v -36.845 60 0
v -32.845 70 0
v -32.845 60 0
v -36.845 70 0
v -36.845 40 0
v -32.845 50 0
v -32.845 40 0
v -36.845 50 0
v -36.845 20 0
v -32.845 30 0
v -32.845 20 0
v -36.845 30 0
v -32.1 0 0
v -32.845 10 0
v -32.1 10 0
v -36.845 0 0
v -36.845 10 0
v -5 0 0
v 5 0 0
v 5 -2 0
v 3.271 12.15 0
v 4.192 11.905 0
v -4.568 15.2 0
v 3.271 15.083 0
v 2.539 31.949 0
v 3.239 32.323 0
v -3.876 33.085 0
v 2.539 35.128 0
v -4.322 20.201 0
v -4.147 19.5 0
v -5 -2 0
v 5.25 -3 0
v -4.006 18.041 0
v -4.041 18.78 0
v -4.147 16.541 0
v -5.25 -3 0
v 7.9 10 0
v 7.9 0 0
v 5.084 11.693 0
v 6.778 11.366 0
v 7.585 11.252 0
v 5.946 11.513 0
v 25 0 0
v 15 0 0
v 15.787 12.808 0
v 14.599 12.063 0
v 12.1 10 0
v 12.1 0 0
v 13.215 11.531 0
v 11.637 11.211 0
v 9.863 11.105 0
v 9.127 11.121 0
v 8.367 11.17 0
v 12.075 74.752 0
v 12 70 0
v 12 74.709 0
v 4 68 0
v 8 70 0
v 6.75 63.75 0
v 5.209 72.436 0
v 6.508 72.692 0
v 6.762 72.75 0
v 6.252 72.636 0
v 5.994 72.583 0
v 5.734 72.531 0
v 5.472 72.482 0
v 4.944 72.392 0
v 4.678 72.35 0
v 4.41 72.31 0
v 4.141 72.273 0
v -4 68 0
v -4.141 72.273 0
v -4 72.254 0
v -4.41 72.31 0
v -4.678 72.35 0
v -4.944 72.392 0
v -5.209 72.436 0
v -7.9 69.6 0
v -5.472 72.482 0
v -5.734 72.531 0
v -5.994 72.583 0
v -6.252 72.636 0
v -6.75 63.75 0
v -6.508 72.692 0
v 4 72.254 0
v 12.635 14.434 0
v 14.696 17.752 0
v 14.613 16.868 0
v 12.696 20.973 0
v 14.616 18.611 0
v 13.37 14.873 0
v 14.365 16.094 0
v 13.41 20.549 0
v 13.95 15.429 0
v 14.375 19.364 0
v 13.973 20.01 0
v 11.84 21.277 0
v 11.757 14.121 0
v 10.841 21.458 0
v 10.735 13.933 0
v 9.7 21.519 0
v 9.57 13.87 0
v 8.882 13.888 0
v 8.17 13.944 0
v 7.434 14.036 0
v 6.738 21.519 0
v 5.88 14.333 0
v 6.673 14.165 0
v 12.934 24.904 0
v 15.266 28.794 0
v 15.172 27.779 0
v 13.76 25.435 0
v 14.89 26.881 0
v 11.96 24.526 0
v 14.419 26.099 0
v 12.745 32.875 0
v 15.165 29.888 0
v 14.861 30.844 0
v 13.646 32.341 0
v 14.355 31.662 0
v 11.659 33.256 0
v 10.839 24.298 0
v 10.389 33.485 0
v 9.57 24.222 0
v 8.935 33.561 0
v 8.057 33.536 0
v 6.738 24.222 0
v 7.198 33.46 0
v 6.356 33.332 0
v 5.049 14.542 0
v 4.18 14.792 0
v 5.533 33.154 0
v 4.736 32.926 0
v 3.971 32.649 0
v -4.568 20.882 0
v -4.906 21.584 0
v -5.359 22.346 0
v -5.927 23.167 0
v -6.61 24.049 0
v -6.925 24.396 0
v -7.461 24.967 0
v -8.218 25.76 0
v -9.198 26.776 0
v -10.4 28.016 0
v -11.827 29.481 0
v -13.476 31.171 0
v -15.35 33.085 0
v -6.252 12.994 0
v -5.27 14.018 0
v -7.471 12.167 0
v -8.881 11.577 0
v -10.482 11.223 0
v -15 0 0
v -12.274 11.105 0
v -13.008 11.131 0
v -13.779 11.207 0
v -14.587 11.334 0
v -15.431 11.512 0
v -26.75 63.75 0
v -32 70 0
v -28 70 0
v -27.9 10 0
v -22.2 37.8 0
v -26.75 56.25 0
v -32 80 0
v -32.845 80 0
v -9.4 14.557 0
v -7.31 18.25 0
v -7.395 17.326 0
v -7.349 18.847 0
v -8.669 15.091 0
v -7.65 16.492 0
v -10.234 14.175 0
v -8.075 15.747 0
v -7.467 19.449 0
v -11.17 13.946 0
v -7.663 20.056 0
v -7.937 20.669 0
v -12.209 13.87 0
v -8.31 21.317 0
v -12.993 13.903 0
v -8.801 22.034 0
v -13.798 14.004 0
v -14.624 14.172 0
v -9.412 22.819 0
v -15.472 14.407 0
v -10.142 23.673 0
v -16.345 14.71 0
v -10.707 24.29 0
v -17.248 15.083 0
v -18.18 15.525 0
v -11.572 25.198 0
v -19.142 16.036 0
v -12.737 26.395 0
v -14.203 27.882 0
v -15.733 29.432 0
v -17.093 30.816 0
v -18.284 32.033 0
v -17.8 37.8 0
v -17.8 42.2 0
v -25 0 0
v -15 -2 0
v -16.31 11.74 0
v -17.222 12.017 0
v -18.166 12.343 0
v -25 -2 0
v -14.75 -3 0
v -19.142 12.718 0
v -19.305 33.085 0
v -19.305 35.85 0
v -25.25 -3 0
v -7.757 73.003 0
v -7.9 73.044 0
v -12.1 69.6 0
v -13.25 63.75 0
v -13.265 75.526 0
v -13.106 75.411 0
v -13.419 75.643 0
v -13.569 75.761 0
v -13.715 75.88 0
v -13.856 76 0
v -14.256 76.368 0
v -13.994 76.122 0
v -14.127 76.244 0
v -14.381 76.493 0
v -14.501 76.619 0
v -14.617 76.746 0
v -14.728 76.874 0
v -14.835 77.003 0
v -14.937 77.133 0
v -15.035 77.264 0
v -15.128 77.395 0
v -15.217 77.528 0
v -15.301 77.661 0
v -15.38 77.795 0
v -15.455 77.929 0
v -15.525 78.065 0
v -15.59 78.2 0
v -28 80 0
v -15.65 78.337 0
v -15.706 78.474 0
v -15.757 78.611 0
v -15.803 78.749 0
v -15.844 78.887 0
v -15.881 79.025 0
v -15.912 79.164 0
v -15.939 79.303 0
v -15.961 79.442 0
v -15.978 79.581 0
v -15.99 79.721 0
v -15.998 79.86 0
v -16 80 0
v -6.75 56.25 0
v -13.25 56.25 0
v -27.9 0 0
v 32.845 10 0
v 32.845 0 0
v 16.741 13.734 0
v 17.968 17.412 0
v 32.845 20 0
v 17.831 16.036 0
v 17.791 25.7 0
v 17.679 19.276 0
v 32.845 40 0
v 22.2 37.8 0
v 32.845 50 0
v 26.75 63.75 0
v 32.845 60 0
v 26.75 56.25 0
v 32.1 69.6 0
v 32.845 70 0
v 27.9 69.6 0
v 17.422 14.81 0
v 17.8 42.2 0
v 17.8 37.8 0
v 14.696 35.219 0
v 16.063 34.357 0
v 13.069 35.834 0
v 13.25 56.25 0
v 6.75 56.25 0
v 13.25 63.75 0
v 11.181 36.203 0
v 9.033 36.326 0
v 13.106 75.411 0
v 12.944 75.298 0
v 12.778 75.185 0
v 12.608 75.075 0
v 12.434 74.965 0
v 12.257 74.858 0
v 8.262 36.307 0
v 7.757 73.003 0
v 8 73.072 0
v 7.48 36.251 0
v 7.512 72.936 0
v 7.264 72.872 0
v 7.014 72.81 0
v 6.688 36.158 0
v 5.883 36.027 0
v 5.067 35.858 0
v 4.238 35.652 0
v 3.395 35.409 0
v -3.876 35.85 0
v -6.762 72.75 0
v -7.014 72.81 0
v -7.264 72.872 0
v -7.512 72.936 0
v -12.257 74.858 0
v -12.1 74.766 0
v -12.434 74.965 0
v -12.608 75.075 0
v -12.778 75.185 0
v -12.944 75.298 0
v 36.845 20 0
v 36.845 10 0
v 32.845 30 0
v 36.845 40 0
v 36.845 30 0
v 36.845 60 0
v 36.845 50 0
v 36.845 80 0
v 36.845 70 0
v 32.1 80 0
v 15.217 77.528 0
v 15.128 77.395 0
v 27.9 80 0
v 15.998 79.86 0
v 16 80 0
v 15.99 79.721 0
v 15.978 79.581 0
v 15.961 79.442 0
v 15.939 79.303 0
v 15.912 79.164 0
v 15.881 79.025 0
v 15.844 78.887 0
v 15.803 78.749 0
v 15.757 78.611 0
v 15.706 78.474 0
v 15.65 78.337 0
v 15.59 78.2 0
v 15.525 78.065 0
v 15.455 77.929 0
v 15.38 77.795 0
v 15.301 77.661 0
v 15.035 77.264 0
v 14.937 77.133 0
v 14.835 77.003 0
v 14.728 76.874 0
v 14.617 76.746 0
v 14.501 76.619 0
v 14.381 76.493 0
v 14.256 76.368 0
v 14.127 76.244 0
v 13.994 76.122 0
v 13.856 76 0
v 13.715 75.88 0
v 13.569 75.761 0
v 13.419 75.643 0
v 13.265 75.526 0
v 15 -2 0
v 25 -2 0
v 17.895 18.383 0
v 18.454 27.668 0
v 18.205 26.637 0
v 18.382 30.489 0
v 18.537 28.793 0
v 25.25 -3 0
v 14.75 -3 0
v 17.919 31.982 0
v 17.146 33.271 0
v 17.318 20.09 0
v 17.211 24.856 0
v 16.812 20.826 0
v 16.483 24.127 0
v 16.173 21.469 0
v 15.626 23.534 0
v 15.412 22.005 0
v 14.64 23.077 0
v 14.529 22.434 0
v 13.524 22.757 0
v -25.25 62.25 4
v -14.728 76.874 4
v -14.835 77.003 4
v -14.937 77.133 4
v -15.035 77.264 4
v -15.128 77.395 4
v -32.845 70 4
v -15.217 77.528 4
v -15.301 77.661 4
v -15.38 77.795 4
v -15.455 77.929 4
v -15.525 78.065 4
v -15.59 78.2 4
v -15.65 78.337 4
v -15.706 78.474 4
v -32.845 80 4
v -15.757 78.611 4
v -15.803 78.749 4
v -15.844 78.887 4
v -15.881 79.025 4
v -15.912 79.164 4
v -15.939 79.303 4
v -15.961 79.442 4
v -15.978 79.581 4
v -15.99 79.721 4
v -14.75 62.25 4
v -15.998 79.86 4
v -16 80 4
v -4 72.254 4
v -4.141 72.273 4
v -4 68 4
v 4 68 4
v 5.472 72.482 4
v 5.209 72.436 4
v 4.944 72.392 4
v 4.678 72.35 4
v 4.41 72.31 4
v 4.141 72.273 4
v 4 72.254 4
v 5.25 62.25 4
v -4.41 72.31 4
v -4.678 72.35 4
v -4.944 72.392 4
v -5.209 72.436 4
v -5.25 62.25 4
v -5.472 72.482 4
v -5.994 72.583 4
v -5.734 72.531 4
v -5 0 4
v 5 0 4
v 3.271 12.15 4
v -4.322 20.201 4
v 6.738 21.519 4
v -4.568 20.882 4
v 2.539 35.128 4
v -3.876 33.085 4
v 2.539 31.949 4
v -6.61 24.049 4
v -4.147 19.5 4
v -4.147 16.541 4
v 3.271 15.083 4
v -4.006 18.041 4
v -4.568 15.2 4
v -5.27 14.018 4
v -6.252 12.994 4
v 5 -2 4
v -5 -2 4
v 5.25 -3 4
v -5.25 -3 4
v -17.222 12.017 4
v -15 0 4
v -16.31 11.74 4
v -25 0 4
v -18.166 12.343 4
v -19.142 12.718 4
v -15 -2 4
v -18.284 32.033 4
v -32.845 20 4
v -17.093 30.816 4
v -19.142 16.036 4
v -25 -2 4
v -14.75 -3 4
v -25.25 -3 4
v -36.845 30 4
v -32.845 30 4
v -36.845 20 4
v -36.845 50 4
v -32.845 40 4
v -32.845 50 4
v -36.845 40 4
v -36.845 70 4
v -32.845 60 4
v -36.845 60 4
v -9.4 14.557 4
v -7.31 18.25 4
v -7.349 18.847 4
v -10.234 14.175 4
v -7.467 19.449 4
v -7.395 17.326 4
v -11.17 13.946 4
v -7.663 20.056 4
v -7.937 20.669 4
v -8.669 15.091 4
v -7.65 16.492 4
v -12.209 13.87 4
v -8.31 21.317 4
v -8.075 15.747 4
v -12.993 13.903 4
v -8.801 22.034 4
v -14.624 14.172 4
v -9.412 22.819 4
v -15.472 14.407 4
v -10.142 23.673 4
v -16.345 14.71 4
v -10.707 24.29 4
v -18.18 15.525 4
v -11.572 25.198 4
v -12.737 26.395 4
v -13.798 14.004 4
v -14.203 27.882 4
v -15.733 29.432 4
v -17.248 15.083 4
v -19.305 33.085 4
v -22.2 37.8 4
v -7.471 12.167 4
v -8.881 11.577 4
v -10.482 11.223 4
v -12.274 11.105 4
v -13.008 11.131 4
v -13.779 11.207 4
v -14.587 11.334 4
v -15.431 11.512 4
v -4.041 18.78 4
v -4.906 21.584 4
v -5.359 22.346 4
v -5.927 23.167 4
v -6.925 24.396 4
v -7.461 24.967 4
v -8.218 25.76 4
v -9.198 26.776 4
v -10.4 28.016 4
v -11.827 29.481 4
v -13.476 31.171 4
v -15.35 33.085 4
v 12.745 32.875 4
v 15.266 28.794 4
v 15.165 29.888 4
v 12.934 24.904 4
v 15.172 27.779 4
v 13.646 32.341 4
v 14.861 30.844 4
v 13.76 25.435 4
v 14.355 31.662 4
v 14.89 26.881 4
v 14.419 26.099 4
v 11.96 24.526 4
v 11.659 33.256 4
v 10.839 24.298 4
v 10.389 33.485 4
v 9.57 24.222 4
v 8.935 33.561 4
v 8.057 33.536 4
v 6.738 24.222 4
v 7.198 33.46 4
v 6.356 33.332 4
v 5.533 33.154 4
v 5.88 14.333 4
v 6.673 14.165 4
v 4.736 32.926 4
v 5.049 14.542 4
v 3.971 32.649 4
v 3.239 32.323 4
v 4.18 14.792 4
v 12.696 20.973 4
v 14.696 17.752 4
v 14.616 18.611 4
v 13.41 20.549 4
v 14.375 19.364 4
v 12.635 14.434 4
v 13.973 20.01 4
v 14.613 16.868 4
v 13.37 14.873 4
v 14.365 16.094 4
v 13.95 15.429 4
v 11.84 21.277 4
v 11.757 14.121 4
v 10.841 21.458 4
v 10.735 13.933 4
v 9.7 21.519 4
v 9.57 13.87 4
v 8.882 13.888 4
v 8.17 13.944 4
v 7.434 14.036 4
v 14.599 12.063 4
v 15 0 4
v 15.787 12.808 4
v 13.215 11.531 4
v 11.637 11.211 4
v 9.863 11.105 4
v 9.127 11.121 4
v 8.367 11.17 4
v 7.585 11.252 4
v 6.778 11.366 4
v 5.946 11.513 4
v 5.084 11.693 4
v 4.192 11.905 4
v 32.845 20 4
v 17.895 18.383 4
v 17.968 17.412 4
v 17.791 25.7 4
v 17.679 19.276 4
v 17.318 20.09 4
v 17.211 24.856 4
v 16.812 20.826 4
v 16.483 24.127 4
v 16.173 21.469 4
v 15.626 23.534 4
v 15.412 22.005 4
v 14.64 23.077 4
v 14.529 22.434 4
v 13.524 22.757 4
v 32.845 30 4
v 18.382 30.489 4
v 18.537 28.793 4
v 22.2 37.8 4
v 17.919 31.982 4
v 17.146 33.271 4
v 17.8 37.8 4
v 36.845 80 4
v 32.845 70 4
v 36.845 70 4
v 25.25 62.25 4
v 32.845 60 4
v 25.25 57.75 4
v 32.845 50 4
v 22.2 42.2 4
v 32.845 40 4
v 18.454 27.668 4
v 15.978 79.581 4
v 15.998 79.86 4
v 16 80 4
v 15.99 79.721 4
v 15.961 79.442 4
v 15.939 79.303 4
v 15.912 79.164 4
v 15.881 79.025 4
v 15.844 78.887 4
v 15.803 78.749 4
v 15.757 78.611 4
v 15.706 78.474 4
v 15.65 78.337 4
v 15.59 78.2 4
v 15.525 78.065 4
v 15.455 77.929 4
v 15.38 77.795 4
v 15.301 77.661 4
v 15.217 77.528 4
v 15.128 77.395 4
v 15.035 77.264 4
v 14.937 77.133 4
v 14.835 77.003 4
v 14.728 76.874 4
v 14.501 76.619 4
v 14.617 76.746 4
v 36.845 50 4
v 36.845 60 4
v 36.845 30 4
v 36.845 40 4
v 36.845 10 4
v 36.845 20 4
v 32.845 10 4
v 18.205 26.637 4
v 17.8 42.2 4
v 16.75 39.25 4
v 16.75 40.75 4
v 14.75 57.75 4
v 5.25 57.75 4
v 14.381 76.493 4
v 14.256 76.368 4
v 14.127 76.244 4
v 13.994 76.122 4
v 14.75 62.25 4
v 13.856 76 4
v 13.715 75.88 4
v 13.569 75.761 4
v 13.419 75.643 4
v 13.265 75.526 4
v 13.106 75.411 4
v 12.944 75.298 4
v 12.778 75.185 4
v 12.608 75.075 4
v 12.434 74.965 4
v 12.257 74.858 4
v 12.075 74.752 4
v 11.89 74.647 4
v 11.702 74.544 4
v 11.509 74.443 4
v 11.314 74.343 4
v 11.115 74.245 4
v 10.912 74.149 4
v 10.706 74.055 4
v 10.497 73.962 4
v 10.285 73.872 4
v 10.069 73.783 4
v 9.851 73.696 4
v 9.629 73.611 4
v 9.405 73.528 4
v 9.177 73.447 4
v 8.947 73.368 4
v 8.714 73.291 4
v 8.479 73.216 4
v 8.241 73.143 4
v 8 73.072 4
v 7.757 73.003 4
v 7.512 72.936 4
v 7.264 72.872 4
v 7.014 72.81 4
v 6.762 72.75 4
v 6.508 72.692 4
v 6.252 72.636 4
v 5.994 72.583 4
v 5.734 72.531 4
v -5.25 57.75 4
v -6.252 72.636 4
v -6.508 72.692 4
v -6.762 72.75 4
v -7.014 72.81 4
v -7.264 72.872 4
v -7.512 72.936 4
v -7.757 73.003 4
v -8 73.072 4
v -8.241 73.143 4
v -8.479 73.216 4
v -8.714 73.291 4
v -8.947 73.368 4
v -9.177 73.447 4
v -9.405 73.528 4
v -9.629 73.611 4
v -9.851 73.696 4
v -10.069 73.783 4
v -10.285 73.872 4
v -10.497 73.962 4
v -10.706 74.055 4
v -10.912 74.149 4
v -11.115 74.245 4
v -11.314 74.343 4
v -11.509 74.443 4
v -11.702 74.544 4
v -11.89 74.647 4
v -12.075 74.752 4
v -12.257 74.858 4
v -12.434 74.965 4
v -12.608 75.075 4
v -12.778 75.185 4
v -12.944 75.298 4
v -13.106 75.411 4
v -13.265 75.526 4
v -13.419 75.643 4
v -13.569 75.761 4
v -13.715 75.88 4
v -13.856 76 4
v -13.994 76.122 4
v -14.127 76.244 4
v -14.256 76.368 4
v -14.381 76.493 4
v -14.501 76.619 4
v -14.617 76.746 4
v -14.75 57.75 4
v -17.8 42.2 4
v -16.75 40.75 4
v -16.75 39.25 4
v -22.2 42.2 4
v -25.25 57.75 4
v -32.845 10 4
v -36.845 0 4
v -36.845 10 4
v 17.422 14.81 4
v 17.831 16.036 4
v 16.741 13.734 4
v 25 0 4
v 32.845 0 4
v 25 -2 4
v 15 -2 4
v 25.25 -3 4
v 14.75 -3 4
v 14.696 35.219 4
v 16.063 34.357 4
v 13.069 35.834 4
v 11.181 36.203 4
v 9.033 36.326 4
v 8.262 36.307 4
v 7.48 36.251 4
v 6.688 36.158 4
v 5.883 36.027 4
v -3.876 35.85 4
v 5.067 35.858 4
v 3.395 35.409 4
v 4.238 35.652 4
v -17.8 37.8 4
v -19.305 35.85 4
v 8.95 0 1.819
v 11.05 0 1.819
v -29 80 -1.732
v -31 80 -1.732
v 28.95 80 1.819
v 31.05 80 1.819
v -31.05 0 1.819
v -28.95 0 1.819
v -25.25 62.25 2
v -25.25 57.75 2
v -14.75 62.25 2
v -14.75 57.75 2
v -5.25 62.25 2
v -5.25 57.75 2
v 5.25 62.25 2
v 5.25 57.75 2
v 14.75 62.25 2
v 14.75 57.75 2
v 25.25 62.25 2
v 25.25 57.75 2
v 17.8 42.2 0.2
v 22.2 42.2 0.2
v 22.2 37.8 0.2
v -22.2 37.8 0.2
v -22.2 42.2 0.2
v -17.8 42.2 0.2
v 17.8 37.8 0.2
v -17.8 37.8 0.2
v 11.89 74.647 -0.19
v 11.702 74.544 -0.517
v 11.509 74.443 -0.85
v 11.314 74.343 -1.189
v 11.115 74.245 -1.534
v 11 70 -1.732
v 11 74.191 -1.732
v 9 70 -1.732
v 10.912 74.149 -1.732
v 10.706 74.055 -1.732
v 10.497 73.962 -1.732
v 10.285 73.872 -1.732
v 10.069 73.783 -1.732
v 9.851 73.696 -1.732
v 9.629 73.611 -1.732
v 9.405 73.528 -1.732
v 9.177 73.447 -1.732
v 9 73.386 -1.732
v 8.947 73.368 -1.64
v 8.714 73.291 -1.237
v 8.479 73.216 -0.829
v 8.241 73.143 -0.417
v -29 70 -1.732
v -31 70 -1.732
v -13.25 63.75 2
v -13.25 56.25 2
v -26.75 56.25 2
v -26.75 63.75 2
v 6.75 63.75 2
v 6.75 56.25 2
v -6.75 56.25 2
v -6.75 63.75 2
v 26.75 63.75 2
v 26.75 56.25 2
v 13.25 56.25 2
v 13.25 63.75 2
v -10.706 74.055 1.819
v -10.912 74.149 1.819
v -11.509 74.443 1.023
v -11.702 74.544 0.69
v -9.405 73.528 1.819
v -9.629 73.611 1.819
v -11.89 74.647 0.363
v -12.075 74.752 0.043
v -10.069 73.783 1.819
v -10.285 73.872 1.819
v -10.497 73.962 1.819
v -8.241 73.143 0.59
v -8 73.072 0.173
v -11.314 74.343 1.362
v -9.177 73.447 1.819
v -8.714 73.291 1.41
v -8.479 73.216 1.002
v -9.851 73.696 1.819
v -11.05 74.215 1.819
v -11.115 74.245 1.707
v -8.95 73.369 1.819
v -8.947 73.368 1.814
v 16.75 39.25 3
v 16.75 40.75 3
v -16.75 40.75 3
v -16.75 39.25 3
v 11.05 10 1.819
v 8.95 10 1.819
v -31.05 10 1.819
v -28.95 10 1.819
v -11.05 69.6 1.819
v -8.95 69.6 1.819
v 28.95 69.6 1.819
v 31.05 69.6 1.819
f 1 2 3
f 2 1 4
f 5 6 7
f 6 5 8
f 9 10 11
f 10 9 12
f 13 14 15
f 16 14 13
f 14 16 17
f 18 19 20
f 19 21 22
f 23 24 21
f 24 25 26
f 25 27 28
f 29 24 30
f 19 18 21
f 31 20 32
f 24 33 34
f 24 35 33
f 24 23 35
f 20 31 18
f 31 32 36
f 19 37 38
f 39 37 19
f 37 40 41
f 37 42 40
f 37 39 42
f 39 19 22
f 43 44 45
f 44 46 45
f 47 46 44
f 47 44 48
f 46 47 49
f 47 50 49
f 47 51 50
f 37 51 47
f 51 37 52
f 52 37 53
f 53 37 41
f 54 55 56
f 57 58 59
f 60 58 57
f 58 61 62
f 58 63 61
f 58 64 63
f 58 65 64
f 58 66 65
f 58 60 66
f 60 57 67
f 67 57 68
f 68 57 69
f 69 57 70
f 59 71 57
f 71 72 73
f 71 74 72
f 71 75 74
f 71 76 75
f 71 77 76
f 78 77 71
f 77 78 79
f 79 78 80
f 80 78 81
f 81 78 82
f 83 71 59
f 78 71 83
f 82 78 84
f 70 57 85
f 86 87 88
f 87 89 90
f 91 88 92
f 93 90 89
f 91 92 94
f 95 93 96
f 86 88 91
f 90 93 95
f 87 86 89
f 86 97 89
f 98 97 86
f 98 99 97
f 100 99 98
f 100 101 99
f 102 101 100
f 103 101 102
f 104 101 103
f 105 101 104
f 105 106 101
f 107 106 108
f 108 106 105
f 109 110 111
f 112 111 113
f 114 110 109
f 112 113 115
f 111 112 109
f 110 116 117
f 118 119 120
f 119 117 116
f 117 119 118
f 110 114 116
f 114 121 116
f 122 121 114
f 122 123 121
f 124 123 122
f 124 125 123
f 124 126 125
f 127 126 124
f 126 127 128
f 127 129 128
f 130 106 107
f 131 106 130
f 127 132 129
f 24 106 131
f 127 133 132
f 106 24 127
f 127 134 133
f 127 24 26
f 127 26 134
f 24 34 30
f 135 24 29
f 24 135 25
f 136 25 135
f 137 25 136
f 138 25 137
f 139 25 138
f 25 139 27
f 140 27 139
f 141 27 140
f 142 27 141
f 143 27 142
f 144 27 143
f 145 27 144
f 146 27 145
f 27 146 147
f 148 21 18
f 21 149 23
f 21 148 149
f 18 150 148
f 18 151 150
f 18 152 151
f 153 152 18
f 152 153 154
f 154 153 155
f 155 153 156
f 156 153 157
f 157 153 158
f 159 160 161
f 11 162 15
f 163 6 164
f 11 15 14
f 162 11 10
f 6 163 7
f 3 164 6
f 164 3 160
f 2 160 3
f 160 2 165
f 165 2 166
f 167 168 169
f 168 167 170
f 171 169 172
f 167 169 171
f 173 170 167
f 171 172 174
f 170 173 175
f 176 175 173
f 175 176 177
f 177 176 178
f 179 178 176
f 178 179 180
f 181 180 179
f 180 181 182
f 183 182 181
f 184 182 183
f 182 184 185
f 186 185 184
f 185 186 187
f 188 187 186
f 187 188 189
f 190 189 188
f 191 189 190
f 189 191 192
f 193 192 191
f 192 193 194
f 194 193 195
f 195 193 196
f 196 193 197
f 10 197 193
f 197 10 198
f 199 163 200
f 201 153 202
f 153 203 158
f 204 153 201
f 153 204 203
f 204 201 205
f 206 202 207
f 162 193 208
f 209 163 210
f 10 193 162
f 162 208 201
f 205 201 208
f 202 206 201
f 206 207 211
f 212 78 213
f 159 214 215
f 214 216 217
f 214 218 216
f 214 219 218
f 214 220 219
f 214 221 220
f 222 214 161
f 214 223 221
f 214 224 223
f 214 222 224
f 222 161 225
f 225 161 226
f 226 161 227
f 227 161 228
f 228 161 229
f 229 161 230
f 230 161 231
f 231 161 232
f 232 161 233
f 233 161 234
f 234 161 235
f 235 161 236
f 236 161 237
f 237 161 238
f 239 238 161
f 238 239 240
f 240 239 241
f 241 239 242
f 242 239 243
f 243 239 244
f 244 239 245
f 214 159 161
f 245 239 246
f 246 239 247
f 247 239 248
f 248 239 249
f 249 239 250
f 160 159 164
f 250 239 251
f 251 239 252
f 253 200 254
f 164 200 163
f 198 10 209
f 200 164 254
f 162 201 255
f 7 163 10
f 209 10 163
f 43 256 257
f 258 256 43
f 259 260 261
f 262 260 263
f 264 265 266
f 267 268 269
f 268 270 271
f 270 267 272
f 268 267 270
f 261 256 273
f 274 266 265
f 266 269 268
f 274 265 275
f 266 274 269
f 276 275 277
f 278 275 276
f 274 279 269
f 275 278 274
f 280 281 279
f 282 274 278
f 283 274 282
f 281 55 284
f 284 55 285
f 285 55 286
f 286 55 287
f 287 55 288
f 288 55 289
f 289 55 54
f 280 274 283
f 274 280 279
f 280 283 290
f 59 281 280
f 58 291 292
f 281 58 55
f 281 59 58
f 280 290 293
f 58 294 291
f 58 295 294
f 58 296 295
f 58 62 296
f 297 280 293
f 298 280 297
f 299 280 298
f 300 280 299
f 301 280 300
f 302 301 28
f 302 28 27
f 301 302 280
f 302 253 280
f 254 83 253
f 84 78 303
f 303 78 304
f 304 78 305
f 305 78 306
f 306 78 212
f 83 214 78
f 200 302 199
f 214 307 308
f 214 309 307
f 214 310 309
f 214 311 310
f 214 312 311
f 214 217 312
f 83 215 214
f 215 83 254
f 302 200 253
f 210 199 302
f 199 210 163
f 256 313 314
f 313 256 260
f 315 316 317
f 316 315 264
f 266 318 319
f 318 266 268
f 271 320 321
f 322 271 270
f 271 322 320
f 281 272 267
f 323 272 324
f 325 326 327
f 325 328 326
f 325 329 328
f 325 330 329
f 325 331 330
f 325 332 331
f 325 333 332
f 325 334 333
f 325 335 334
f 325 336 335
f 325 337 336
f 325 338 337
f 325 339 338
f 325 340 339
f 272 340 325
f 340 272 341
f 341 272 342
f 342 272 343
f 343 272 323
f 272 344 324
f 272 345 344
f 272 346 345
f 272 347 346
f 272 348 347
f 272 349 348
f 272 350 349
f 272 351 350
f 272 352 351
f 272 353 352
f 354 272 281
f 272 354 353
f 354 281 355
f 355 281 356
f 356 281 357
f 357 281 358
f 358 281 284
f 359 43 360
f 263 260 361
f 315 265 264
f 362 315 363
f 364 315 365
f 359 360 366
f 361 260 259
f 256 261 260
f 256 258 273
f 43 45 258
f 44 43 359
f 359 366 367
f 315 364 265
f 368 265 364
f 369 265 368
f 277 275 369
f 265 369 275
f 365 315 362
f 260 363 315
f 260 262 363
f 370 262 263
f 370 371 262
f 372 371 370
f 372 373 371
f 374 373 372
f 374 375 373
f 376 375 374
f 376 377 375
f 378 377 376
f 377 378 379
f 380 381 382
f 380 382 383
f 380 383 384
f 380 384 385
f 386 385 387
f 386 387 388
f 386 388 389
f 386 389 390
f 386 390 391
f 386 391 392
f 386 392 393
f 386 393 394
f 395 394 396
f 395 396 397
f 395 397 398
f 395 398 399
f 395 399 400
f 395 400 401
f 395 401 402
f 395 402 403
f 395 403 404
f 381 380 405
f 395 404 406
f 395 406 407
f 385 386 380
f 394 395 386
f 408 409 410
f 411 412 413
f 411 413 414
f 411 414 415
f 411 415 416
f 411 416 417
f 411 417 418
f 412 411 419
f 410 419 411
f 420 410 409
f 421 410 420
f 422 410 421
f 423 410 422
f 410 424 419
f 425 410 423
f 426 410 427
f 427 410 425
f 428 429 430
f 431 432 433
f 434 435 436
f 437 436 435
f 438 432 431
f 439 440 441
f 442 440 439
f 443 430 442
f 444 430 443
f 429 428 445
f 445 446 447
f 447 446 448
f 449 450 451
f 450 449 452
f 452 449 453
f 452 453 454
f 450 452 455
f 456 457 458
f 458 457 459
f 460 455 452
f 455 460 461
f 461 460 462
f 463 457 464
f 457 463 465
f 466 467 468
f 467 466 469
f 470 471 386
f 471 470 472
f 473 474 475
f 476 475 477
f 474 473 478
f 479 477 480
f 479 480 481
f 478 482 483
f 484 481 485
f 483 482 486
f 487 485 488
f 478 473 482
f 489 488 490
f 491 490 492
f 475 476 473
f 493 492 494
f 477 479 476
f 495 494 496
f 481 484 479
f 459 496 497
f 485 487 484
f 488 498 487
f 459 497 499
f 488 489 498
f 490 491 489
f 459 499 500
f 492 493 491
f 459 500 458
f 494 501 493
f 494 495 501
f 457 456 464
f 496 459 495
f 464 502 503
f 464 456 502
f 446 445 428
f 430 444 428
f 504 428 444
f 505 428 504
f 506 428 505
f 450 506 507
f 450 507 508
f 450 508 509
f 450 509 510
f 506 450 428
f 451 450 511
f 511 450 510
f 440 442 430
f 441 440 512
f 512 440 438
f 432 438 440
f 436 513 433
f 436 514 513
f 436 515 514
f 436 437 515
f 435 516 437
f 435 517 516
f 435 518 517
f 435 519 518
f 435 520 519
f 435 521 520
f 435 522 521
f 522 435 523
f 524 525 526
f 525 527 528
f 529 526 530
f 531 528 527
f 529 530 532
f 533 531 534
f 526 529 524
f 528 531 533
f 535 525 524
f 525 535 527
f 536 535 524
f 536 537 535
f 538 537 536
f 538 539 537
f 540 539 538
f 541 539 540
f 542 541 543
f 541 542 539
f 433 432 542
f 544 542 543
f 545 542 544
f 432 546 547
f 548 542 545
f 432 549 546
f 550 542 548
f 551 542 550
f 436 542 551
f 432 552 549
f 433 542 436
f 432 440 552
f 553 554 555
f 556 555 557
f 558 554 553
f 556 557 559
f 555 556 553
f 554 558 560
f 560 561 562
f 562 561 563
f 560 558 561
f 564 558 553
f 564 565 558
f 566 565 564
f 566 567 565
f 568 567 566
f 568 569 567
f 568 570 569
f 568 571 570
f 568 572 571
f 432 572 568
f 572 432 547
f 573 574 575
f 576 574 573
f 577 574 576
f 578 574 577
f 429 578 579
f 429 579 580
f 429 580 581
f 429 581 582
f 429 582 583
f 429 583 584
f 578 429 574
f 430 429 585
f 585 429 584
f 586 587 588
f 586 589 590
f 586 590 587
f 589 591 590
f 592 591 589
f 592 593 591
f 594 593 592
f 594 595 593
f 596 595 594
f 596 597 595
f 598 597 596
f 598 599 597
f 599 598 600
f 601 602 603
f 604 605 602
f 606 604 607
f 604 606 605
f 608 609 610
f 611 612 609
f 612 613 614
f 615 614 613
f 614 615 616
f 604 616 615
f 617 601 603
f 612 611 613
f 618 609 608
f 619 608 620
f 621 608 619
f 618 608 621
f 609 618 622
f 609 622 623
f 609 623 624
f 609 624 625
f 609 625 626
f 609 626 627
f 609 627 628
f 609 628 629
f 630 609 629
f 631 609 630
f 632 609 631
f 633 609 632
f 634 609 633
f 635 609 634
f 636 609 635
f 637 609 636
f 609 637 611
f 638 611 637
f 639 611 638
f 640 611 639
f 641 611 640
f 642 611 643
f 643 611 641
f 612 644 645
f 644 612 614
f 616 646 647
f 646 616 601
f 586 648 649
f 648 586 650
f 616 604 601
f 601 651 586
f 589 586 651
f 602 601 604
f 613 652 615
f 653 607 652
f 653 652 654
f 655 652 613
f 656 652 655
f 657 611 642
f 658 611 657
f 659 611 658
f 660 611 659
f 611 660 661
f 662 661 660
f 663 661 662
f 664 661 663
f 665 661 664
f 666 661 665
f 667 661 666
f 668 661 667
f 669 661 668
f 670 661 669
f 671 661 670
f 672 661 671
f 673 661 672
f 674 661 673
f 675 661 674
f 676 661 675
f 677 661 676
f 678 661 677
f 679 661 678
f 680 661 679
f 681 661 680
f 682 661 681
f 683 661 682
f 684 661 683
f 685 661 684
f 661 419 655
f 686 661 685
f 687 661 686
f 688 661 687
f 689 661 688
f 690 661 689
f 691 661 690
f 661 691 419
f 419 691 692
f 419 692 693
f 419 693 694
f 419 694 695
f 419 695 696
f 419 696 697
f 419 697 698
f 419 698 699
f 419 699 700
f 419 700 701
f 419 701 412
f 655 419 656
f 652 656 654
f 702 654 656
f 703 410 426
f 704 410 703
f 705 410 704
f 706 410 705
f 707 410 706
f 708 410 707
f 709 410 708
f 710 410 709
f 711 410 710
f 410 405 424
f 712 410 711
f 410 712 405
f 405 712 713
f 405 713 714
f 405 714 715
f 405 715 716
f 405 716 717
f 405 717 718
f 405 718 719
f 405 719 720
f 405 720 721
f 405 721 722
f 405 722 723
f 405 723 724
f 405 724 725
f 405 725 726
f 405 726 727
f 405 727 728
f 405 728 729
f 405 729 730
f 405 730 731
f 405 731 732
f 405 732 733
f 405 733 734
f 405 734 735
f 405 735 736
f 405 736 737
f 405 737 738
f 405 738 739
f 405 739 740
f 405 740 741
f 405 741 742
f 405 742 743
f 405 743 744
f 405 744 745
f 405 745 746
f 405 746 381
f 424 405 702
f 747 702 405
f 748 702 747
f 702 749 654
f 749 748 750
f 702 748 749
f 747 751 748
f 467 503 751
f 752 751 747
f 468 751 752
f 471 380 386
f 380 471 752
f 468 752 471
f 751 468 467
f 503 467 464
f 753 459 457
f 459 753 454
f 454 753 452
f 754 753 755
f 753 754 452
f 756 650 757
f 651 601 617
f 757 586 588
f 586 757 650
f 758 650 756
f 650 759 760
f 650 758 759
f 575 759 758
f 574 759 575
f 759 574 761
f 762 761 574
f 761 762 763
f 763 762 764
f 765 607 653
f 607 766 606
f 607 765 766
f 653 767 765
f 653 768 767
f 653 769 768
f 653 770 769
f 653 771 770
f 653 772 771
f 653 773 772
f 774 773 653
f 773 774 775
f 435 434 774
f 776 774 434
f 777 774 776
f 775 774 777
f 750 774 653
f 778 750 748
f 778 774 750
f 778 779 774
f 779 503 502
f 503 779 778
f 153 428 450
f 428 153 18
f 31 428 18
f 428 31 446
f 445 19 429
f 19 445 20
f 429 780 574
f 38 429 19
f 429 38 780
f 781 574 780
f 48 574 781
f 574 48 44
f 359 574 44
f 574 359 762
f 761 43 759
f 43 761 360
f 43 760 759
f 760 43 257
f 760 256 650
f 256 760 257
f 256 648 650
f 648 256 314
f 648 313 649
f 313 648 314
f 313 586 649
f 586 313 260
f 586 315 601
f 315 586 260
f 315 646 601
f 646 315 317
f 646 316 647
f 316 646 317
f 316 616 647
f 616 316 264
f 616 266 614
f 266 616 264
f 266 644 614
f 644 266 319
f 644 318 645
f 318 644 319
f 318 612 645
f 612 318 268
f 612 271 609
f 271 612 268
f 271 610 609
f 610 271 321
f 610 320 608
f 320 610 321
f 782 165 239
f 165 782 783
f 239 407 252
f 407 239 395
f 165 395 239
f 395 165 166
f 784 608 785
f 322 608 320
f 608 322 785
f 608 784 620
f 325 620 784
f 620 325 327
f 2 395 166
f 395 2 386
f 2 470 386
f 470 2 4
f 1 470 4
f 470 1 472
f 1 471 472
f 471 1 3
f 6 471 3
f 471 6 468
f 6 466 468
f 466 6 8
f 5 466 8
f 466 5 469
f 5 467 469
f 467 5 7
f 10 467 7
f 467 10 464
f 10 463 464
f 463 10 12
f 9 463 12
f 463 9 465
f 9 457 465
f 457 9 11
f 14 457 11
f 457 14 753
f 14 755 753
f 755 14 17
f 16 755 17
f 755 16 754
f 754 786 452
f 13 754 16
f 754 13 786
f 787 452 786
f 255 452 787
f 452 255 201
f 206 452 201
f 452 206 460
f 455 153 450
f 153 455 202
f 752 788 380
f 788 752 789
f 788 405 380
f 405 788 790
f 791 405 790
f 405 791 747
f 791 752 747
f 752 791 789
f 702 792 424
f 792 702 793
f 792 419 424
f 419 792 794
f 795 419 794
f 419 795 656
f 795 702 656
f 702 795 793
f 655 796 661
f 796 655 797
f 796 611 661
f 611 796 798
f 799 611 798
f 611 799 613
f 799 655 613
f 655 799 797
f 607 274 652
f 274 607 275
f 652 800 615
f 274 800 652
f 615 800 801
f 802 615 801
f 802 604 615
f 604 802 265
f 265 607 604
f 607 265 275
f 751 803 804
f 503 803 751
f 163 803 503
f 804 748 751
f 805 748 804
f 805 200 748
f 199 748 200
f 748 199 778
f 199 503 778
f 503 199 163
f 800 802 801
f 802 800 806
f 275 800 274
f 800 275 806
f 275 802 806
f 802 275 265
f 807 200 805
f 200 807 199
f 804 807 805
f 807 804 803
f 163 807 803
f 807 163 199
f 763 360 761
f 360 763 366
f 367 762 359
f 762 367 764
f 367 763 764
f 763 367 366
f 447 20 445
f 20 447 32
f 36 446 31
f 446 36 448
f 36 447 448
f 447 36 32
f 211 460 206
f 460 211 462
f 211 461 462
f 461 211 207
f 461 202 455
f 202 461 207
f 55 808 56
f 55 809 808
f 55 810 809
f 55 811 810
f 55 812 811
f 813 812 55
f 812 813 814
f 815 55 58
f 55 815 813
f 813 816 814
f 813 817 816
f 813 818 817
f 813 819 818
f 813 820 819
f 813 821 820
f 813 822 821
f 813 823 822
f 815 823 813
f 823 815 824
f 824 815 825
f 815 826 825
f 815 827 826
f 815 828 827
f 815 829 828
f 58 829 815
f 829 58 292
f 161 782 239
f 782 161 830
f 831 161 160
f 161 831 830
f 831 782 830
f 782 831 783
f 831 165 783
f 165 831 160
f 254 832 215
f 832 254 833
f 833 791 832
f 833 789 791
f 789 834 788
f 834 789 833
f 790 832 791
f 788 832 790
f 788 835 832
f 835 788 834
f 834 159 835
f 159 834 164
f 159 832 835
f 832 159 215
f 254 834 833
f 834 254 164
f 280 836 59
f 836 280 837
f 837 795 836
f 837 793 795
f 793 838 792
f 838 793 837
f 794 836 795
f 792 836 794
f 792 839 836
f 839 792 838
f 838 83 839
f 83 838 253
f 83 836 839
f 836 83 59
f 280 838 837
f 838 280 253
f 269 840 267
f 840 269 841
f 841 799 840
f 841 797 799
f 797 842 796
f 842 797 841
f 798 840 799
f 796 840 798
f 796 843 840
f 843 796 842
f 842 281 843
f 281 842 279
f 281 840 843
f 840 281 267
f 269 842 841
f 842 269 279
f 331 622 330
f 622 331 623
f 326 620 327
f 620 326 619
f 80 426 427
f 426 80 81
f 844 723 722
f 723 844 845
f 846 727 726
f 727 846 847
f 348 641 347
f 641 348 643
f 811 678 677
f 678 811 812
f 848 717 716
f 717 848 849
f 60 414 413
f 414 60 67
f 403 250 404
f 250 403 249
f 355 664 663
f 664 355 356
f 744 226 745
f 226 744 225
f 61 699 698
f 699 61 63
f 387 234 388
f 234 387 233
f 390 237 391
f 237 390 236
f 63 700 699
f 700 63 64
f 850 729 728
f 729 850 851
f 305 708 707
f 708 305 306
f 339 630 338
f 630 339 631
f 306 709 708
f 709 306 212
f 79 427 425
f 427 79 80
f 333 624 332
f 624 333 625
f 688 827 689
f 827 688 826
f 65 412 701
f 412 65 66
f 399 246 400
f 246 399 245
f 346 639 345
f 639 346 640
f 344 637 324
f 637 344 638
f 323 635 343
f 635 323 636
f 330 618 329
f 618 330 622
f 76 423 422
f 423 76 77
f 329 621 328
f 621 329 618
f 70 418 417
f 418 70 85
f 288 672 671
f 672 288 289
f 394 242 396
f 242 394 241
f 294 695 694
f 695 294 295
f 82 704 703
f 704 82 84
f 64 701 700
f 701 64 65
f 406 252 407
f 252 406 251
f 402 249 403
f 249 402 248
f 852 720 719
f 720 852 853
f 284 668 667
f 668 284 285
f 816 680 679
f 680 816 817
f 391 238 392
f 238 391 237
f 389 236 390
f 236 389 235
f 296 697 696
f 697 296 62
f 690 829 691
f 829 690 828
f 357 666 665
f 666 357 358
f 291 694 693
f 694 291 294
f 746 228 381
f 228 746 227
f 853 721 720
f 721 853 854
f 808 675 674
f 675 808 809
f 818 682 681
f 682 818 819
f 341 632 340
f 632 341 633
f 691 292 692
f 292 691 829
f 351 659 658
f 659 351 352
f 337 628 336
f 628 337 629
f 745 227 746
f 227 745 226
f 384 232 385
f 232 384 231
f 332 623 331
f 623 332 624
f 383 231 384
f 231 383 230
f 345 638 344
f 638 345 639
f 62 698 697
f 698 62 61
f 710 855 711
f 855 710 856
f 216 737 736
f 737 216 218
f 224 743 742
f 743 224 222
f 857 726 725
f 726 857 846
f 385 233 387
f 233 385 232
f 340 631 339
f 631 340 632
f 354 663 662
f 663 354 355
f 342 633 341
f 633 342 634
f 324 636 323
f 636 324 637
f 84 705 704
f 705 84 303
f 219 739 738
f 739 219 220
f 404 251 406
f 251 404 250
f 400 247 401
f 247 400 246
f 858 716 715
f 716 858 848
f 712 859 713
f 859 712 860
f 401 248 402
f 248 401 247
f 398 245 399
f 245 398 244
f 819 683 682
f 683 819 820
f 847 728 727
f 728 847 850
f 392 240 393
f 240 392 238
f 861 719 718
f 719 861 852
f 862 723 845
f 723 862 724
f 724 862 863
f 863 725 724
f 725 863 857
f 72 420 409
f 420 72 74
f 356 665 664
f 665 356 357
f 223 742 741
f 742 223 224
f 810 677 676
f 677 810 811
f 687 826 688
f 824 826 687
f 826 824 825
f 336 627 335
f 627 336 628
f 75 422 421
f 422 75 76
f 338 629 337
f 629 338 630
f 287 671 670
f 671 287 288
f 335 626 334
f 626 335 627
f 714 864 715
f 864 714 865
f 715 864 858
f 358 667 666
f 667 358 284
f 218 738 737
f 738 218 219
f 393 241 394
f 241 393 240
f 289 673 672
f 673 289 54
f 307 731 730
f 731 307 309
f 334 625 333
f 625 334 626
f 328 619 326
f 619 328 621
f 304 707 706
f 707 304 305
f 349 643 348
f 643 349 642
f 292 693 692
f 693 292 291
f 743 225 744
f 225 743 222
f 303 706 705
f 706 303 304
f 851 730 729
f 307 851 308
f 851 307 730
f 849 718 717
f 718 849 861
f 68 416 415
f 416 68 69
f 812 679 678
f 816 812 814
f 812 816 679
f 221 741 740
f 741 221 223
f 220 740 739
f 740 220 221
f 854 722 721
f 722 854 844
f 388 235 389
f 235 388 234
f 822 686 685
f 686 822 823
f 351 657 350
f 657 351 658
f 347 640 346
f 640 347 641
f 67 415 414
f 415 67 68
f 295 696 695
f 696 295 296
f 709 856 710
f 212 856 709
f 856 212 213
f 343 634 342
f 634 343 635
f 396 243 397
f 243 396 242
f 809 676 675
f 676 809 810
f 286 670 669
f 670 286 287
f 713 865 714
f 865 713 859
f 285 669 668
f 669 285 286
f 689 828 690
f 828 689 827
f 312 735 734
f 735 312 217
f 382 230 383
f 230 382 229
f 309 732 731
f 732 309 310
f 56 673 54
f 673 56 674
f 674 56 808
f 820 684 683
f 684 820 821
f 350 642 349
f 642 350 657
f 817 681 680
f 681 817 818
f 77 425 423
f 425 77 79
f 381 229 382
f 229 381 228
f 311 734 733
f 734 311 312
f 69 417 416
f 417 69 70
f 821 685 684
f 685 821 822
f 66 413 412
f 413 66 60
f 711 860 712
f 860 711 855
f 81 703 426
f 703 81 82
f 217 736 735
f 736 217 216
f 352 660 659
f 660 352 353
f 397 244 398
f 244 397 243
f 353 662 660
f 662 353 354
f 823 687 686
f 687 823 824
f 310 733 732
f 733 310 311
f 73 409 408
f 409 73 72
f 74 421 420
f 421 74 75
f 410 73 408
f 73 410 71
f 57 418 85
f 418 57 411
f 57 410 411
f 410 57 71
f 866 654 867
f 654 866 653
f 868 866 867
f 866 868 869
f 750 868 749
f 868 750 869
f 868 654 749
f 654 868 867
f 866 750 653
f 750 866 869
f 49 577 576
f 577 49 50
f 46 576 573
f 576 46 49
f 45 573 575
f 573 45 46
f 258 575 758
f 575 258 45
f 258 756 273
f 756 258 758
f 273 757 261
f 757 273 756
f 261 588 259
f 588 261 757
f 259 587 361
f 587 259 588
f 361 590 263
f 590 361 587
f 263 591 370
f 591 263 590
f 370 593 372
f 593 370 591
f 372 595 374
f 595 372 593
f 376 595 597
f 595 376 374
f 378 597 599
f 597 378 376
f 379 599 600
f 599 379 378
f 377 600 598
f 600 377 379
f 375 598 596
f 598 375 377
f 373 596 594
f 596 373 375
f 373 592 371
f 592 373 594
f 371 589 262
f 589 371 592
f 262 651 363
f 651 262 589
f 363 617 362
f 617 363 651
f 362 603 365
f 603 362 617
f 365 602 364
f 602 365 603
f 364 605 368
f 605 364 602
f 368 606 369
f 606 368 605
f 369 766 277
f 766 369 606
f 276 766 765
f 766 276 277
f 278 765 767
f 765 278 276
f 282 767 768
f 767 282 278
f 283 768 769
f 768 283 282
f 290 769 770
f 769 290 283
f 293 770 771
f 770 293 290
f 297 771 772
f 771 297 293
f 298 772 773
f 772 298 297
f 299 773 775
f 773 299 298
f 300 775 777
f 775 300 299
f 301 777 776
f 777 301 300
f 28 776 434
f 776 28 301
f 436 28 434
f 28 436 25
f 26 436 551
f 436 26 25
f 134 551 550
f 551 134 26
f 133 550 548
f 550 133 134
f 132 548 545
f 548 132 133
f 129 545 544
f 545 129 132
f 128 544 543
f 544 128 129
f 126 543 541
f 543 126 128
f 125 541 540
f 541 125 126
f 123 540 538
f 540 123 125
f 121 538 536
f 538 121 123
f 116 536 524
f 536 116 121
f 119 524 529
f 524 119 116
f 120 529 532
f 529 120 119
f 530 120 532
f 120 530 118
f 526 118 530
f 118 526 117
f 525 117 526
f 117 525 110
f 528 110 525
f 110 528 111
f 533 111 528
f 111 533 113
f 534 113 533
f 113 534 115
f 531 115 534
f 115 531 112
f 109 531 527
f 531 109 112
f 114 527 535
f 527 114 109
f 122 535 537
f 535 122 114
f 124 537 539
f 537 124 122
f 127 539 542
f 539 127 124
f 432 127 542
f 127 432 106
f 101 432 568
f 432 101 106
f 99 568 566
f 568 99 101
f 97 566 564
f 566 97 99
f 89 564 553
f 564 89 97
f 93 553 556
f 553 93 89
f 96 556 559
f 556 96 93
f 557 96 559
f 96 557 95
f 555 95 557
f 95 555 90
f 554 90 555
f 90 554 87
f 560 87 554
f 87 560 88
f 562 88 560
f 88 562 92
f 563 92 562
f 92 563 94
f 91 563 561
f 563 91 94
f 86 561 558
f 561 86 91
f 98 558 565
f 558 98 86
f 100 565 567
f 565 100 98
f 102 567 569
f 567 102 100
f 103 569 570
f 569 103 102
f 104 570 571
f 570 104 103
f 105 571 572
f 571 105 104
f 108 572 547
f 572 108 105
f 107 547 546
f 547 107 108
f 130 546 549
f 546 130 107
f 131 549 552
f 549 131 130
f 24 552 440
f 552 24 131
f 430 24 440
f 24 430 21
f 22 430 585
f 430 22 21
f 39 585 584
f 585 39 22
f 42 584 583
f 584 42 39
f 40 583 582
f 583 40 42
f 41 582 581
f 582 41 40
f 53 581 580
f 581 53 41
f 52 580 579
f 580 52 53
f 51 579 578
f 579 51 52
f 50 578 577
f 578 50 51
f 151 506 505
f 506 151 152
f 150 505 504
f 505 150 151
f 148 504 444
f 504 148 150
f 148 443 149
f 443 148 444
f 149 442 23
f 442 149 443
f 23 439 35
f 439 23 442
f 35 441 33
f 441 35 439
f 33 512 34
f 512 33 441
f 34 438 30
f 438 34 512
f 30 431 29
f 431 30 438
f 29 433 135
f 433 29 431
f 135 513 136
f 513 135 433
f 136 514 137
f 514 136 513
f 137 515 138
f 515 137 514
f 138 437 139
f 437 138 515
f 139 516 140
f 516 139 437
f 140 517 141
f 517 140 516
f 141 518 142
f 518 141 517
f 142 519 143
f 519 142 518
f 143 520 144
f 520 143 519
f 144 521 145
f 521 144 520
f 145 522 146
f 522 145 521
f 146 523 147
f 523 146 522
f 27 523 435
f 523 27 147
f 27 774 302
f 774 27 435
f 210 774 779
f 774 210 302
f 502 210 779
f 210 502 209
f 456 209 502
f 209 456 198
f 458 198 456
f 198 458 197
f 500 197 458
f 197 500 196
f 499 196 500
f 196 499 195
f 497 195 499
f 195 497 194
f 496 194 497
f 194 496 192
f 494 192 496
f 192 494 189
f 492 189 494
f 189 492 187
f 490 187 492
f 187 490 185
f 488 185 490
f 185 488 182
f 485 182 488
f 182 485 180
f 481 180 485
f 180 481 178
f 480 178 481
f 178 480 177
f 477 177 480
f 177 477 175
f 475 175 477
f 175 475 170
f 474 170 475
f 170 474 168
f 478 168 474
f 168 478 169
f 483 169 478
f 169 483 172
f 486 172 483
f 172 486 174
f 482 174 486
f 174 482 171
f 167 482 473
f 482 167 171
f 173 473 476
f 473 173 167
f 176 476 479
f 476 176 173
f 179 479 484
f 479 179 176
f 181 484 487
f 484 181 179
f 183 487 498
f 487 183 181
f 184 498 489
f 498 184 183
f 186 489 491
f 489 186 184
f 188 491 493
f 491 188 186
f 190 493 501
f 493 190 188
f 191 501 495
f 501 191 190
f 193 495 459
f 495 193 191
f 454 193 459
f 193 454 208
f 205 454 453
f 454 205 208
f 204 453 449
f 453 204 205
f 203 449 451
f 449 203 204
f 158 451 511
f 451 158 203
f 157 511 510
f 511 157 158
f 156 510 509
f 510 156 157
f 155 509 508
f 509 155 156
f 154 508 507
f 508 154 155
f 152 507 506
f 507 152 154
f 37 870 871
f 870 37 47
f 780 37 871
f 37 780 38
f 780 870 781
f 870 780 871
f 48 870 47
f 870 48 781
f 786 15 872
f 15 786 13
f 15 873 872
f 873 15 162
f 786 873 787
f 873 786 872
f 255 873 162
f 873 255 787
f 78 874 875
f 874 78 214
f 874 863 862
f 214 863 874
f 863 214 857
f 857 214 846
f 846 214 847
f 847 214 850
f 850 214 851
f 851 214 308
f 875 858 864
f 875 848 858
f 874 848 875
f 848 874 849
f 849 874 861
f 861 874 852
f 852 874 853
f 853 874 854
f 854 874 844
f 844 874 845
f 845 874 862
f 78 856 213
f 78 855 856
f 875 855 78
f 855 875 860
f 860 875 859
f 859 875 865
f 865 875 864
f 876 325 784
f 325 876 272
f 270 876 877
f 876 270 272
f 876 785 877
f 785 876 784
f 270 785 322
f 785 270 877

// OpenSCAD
wW = 4;    // Thickness/Width of wood
mW = 4;    //                 of a Magnet-Cube
fW = 2;    // Thickness of the front plastic plate
sL = 80;   // sidelength of a triangle
bD = 80;   // Depth of a box (depth w.r.t. frontview)
fC = 3;    // number of fingers in the triangle
fD = 4;    // number on fingers downwards
pW = 12; //width of plug inlet
pD = 8; //depth of plug inlet
pS = 40; //shift from baseline of plug inlet
//lower cable channel:
eW = 8*wW; //larger ellipse width
eH = 4*wW; //ellipse heigt
hR=3; //Rounded con
rH = 4; //depth of the fix hole
dH = 10; //width and height
plotTh=0.2; //Thickness of plate in front of magnet - one filamentline?
mFn = 90; //Resolution of the spheres
// don't change these values
nC = 2*fC+2; //number of Divisions, due to 2fC+1 segments anC one segment that split in the corners
nD = 2*fD;
shortenSide = wW/tan(60)+wW;
sH = 2*(wW/tan(60)+wW/sin(60)); //shorten inner
Expl=0; //-1: closed, the larger the further apart
// concat with shfted rotated versions... bottom left right

printExt = 0.5;
numberStr="23";
fixNumber=false;
type="Number";
//type="Triangle";
//type="Stackenlichten";
SLside();

module SLside() {
    PointLine = concat(genSide(),genSide(-120,[sL/4,sL*sqrt(3)/4]),genSide(120,[-sL/4,sL*sqrt(3)/4]));
    difference() {
    union() {
        linear_extrude(height=wW, twist=0)
        difference() {
            midFC = (fC + 1)/2;
            SidePointLine = concat(genSide(0,[0,0], shortenSide,shortenSide+wW,fW),
                genDepth(0,[sL/2-shortenSide/2-wW,0],[0,0],wW),
                [[sL/2-shortenSide/2,-bD],[-sL/2+shortenSide/2+wW,-bD]],
                -genDepth(0,[sL/2-shortenSide/2-wW,bD],[0,0],wW)   );
            rotate(a=180,v=[1,0,0])
            polygon(points=SidePointLine);
            // minus...
            // Magnets
            translate([2*sL/nC,bD/2])
            square(size = [1.1*mW,1.1*mW], center = true);
            translate([-2*sL/nC,bD/2])
            square(size = [1.1*mW,1.1*mW], center = true);
            //Bottom plate holes
            for (i = [1:fC]) {
                translate([-sL/2+2*i*sL/nC,3*bD/4])
                square([sL/nC+printExt,wW+printExt], center = true);
            };
        };
    //magnet holes front plates
    translate([2*sL/nC,bD/2,plotTh/2])
        cube(size = [1.1*mW,1.1*mW,plotTh], center = true);
    translate([-2*sL/nC,bD/2,plotTh/2])
        cube(size = [1.1*mW,1.1*mW,plotTh], center = true);
    translate([20,-fW]) linear_extrude(wW)
    polygon(points=[[-5.25,-1],[-5,0],[5,0],[5.25,-1]]);
    translate([0,-fW]) linear_extrude(wW)
    polygon(points=[[-5.25,-1],[-5,0],[5,0],[5.25,-1]]);
    translate([-20,-fW]) linear_extrude(wW)
    polygon(points=[[-5.25,-1],[-5,0],[5,0],[5.25,-1]]);
                //Friction bumps - front deactivated, back
    /* translate([-sL/8,dH,0]) rotate(v=[1,0,0],a=90)
      linear_extrude(dH)
            circle(d=rH,$fn=6);
      translate([3*sL/8,dH,0]) rotate(v=[1,0,0],a=90)
      linear_extrude(dH)
            circle(d=rH,$fn=6);*/
    //Inner bottom - deactivated for ellipse
      translate([sL/8,bD,0]) rotate(v=[1,0,0],a=90)
      linear_extrude(dH)
            circle(d=rH,$fn=6);
      translate([-3*sL/8,bD,0]) rotate(v=[1,0,0],a=90)
      linear_extrude(dH)
            circle(d=rH,$fn=6);
        };
    // emphasize bottom plate holders 
    for (i = [1:fC]) {
        translate([-sL/2+2*i*sL/nC,3*bD/4,0])
        cube([sL/nC+3+printExt,wW+3+printExt,4], center = true);
    };
    // cable channel at the bottom
    translate([0,bD,0])
        linear_extrude(3*wW,center=true)
            scale([eW,eH])
            circle(d=1,$fn=360,center=true);
        linear_extrude(3*wW,center=true)
            translate([0,bD-wW]) square([2*wW,4*wW],center=true);

    // magnet fixer
    translate([0,2*bD/4,wW-.4])
       cube([sL/2-2*wW+1.5,1.5,1.2],center=true);
    if (type=="Triangle") {
        translate([0,0,-2*wW/4])
        linear_extrude(height=wW, twist=0)
        translate([0,sL/2+sL*sqrt(3)/16+2,0])
            rotate([0,0,1],a=180)
            scale(0.75)
            difference() {
                polygon(points=PointLine);
                offset(delta=-2.5) polygon(points=PointLine);
            }
        translate([0,0,0*wW/4])
        linear_extrude(height=1.1*wW, twist=0)
        translate([0,sL/2+sL*sqrt(3)/16+2,0])
            rotate([0,0,1],a=180)
            scale(0.75)
            difference() {
                polygon(points=PointLine);
                offset(delta=-2.5) polygon(points=PointLine);
                translate([0,0]) rotate(-30) translate([-3*sL/8,0])
                square([sL/8,bD/2],center=true);
                translate([0,0]) rotate(30) translate([3*sL/8,0])
                square([sL/8,bD/2],center=true);
                translate([8*sL/16,sL/32])
                square([bD/2,sL/8],center=true);
                translate([-8*sL/16,sL/32])
                square([bD/2,sL/8],center=true);
            }
    }
    else
    if (type=="Stackenlichten") {
      lS=4;
      translate([0,0,-0*wW/4])
      linear_extrude(height=1.1*wW, twist=0)
      translate([0,2*sL/8-2-lS])
      rotate(v=[0,1,0], a=180)
      rotate(v=[0,0,1], a=180)
      text("Stacken", font="Pump Triline", valign="center", halign="center", size=15,spacing=1);
      translate([0,0,-0*wW/4])
      linear_extrude(height=1.1*wW, twist=0)
      translate([0,4*sL/8-6-lS])
      rotate(v=[0,1,0], a=180)
      rotate(v=[0,0,1], a=180)
      text("lichten", font="Pump Triline", valign="center", halign="center",size=15,spacing=1);
    }
    else
    if (type=="Number") {
        translate([0,0,-0*wW/4])
        linear_extrude(height=1.1*wW, twist=0)
        translate([0,2.5*sL/8-1])
        rotate(v=[0,1,0], a=180)
        rotate(v=[0,0,1], a=180)
        text(numberStr, font="Pump Triline", valign="center", halign="center",size=24,spacing=1.05);
    };
    //Friction holes
      translate([sL/8,dH,0]) rotate(v=[1,0,0],a=90)
      linear_extrude(dH+0.4)
            circle(d=rH+.2,$fn=6);
      translate([-3*sL/8,dH,0]) rotate(v=[1,0,0],a=90)
      linear_extrude(dH+0.4)
            circle(d=rH+.2,$fn=6);
      translate([-sL/8,bD,0]) rotate(v=[1,0,0],a=90)
      linear_extrude(dH+0.4)
            circle(d=rH+.2,$fn=6);
      translate([3*sL/8,bD,0]) rotate(v=[1,0,0],a=90)
      linear_extrude(dH+0.4)
            circle(d=rH+.2,$fn=6);
    }
    //Fix numbers
    if (fixNumber)
    translate([0,5.5*sL/16,wW-1/2])
    #    cube([13*sL/16,1,1],center=true);
    if (fixNumber)
    translate([0,3.8*sL/16,wW-1/2])
    #    cube([13*sL/16,1,1],center=true);
    // Fix/Foots
    
}

function genSide(a=0,v=[0,0],sLe=0,sRi=0,h=wW) = generateSide([rotM(a)*[-(sL-sLe)/2,0]+v],0,a,v,sLe,sRi,h);   
//Recursively generate fC toothes
function generateSide(pL,i,a,v,sLe,sRi,h) = (i==fC) ? concat(pL,[rotM(a)*[(sL-sRi)/2,0]+v])
    : generateSide(concat(pL,[
        rotM(a)*[-sL/2+(2*i+1.5)*sL/nC,0]+v, rotM(a)*[-sL/2+(2*i+1.5)*sL/nC,h]+v,
        rotM(a)*[-sL/2+(2*i+2.5)*sL/nC,h]+v, rotM(a)*[-sL/2+(2*i+2.5)*sL/nC,0]+v]),i+1,a,v,sLe,sRi,h);
/* 
 * generate inner triangle side
 */
function genInnerSide(a=0,v=[0,0],sLe=0,sRi=0,h=wW) = generateInnerSide([rotM(a)*[-(sL-sLe)/2,h]+v],0,a,v,sLe,sRi,h);   
//Recursively generate fC toothes
function generateInnerSide(pL,i,a,v,sLe,sRi,h) = (i==fC) ? concat(pL,[rotM(a)*[(sL-sRi)/2,h]+v])
    : generateInnerSide(concat(pL,[
        rotM(a)*[-sL/2+(2*i+2.5)*sL/nC,h]+v, rotM(a)*[-sL/2+(2*i+2.5)*sL/nC,0]+v,
        rotM(a)*[-sL/2+(2*i+1.5)*sL/nC,0]+v, rotM(a)*[-sL/2+(2*i+1.5)*sL/nC,h]+v
        ]),i+1,a,v,sLe,sRi,h);
/*
 * generate side
 */
function genDepth(a=0,v=[0,0],start=[0,0],h=wW) = generateDepth([start+v],0,a,v,h,start);
function generateDepth(pL,i,a,v,h,start) = (i==fD) ? pL
    : generateDepth(concat(pL,[
        rotM(a)*(start+[0,-(2*i+1)*bD/nD])+v, rotM(a)*(start+[h,-(2*i+1)*bD/nD])+v,
        rotM(a)*(start+[h,-(2*i+2)*bD/nD])+v, rotM(a)*(start+[0,-(2*i+2)*bD/nD])+v
        ]),i+1,a,v,h,start);
/*
 * Small Helpers
 */
function rotM(a) = [[cos(a),sin(a)],[-sin(a),cos(a)]];
